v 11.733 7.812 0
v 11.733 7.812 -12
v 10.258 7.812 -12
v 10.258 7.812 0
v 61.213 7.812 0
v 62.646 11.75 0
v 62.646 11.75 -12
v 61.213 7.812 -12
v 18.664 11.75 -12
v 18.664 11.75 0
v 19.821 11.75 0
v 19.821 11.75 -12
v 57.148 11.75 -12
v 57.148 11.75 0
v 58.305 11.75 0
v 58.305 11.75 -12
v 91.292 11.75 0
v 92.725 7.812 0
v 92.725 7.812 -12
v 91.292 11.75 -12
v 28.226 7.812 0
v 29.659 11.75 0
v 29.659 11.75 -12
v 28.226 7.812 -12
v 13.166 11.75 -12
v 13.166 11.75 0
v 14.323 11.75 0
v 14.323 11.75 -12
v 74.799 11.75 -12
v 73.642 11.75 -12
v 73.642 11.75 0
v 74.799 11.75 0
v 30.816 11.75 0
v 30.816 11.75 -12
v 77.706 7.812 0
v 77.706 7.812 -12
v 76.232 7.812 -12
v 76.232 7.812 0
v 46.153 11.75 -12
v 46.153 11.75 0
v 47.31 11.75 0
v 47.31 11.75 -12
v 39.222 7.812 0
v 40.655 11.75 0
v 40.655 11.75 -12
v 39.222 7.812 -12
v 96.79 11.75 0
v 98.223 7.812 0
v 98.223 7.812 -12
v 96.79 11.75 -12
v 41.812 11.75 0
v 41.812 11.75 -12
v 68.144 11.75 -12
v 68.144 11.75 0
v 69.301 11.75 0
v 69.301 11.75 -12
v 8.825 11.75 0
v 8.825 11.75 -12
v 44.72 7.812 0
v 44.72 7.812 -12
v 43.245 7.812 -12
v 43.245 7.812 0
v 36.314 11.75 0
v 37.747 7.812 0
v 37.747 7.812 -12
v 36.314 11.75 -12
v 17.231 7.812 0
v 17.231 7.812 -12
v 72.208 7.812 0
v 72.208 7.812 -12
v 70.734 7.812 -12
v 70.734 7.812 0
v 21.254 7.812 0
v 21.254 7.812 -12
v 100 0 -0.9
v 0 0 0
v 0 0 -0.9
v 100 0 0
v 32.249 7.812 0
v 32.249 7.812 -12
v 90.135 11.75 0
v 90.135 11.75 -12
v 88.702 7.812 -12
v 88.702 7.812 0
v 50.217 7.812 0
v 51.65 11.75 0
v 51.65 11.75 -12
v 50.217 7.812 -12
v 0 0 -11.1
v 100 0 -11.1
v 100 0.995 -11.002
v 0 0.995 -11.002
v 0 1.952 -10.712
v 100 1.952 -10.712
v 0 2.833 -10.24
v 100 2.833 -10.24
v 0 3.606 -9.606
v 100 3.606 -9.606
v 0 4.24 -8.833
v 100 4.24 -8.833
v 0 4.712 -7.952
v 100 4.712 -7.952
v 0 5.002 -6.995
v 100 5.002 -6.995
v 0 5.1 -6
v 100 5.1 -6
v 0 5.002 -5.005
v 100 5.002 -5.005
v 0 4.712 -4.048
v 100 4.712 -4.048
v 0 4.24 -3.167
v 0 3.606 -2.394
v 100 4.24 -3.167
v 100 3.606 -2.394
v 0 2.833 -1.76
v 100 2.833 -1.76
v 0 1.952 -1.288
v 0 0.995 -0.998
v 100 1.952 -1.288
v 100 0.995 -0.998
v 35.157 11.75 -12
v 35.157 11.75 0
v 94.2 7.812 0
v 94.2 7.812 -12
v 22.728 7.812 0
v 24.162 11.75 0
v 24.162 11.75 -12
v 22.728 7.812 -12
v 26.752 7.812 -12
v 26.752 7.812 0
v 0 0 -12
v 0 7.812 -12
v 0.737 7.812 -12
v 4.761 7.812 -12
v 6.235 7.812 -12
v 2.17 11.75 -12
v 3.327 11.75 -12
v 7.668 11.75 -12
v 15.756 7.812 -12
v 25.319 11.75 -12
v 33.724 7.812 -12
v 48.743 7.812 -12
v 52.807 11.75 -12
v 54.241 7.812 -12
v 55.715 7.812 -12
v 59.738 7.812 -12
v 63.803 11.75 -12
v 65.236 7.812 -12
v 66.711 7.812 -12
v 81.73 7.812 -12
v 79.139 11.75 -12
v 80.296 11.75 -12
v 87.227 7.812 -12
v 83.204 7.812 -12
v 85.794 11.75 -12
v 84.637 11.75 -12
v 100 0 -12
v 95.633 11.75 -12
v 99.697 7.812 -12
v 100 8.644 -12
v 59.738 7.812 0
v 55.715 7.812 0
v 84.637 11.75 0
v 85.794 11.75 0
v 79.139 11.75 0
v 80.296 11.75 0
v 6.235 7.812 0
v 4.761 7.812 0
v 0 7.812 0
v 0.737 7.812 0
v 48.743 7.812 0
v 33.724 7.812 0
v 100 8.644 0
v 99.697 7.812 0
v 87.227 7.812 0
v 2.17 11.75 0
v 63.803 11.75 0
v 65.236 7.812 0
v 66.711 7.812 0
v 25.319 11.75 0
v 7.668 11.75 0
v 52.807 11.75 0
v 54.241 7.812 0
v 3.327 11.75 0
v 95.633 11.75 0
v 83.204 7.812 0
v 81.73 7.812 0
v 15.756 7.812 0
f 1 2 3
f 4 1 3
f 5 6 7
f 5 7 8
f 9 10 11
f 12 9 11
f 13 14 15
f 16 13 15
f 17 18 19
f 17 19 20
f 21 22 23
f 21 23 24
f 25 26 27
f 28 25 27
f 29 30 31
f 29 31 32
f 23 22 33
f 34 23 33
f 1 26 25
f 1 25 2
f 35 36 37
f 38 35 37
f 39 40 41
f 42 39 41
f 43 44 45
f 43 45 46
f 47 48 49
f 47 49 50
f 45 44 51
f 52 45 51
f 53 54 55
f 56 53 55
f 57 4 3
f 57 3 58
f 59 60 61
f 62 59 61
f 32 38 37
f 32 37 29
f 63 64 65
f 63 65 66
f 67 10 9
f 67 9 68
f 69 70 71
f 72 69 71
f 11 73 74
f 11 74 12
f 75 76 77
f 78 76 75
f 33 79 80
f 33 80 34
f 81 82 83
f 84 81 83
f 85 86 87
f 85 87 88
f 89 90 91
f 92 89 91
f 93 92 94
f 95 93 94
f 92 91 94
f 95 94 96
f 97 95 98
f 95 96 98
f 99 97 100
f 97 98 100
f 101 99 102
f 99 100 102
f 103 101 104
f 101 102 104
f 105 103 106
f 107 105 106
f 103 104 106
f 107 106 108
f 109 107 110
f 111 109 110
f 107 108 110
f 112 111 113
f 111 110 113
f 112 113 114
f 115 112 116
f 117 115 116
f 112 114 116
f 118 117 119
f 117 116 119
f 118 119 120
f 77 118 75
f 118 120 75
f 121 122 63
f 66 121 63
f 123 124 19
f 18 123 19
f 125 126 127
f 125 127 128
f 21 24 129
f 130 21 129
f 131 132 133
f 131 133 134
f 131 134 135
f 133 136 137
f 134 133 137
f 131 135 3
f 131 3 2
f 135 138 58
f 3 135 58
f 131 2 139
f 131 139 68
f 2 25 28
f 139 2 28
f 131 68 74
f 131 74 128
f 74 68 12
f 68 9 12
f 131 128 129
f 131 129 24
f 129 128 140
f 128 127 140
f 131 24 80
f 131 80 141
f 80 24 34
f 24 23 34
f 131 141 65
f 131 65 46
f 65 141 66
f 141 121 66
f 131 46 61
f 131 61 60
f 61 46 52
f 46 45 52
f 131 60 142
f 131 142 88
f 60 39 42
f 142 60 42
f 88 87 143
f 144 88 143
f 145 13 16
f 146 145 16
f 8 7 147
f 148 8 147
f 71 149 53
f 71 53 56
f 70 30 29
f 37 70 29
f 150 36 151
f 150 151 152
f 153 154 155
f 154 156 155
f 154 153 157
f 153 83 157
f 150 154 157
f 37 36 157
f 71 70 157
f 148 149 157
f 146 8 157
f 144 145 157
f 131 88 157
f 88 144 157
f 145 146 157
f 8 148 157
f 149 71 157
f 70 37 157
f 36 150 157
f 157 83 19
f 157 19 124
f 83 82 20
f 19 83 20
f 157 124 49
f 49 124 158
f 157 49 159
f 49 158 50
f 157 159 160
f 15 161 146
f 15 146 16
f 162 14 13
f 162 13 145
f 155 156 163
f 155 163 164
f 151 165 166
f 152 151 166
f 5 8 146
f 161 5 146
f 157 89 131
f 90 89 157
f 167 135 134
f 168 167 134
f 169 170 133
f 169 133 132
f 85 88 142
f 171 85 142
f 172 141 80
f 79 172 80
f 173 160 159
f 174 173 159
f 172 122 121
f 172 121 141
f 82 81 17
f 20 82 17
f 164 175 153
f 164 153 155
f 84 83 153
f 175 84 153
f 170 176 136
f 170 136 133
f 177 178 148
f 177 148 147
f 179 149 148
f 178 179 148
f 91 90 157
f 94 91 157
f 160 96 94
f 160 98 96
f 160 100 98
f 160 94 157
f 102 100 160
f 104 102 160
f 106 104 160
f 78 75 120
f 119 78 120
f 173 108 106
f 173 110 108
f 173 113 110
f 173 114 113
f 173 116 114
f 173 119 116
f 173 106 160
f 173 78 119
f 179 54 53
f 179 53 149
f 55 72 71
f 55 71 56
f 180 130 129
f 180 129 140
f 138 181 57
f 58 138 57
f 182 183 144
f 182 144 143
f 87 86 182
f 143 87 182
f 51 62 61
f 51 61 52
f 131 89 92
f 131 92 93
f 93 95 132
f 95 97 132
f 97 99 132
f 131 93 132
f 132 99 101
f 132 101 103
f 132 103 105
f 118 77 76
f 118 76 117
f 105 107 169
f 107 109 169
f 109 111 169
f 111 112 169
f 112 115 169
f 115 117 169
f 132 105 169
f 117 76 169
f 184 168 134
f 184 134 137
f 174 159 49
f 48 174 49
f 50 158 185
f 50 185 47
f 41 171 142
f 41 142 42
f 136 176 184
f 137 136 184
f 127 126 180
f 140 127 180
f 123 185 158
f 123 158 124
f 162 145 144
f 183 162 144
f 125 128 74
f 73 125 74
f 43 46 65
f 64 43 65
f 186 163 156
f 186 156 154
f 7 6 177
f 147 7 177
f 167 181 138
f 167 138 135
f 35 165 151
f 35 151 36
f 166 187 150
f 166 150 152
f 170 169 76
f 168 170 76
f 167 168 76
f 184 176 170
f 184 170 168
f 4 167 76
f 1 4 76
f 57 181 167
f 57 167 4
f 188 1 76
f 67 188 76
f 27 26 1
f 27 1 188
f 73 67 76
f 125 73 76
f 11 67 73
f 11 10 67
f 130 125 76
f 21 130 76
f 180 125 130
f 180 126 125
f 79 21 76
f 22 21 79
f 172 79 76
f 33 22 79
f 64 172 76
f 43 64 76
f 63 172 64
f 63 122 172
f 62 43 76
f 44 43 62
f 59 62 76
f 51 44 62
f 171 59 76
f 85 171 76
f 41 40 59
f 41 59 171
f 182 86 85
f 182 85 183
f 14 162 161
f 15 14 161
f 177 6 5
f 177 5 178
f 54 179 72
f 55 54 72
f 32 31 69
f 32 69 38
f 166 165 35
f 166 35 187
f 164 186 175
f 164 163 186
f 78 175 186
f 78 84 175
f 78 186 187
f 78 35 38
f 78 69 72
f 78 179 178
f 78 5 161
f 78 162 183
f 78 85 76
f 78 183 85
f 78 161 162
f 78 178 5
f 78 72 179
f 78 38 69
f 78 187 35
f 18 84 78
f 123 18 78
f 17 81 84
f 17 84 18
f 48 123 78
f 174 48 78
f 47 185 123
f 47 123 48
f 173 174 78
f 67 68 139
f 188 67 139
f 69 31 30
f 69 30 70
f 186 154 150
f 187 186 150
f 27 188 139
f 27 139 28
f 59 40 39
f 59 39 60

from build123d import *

# Parameters (mm, degrees)
BLANKSKE_W         = 100
BLANKSKE_H         = 11.75
BLANK_DEPTH        = 12
TOOTHCUTSIM_DEPTH  = 102.400505423
TEETHCUTS_COUNT    = 19
TEETHCUTS_PITCH    = 5.497787138
SKETCH1_R          = 5.1
CUT_EXTRUDE1_DEPTH = 102.400505423


with BuildPart() as part:
    # BlankSke → Blank (new body)
    with BuildSketch(Plane.XY):
        with Locations((50, 5.875)):
            Rectangle(BLANKSKE_W, BLANKSKE_H)
    extrude(amount=-BLANK_DEPTH)

    # TooCutSkeSim → ToothCutSim (cut, through all)
    with BuildSketch(Plane.XY):
        Polygon((0.737261897, 7.8125), (-0.737261897, 7.8125), (-2.179639538, 11.7754), (2.179639538, 11.7754), align=None)
    toothcutsim = extrude(amount=-TOOTHCUTSIM_DEPTH, mode=Mode.SUBTRACT)

    # TeethCuts: ToothCutSim ×19
    with Locations(*[(i * TEETHCUTS_PITCH, 0, 0) for i in range(1, TEETHCUTS_COUNT)]):
        add(toothcutsim, mode=Mode.SUBTRACT)

    # Sketch1 → Cut-Extrude1 (cut, through all)
    with BuildSketch(Plane(origin=(100, 0, 0), x_dir=(0, 0, -1), z_dir=(1, 0, 0))):
        with Locations((6, 0)):
            Circle(SKETCH1_R)
    extrude(amount=-CUT_EXTRUDE1_DEPTH, mode=Mode.SUBTRACT)


solid = part.part
